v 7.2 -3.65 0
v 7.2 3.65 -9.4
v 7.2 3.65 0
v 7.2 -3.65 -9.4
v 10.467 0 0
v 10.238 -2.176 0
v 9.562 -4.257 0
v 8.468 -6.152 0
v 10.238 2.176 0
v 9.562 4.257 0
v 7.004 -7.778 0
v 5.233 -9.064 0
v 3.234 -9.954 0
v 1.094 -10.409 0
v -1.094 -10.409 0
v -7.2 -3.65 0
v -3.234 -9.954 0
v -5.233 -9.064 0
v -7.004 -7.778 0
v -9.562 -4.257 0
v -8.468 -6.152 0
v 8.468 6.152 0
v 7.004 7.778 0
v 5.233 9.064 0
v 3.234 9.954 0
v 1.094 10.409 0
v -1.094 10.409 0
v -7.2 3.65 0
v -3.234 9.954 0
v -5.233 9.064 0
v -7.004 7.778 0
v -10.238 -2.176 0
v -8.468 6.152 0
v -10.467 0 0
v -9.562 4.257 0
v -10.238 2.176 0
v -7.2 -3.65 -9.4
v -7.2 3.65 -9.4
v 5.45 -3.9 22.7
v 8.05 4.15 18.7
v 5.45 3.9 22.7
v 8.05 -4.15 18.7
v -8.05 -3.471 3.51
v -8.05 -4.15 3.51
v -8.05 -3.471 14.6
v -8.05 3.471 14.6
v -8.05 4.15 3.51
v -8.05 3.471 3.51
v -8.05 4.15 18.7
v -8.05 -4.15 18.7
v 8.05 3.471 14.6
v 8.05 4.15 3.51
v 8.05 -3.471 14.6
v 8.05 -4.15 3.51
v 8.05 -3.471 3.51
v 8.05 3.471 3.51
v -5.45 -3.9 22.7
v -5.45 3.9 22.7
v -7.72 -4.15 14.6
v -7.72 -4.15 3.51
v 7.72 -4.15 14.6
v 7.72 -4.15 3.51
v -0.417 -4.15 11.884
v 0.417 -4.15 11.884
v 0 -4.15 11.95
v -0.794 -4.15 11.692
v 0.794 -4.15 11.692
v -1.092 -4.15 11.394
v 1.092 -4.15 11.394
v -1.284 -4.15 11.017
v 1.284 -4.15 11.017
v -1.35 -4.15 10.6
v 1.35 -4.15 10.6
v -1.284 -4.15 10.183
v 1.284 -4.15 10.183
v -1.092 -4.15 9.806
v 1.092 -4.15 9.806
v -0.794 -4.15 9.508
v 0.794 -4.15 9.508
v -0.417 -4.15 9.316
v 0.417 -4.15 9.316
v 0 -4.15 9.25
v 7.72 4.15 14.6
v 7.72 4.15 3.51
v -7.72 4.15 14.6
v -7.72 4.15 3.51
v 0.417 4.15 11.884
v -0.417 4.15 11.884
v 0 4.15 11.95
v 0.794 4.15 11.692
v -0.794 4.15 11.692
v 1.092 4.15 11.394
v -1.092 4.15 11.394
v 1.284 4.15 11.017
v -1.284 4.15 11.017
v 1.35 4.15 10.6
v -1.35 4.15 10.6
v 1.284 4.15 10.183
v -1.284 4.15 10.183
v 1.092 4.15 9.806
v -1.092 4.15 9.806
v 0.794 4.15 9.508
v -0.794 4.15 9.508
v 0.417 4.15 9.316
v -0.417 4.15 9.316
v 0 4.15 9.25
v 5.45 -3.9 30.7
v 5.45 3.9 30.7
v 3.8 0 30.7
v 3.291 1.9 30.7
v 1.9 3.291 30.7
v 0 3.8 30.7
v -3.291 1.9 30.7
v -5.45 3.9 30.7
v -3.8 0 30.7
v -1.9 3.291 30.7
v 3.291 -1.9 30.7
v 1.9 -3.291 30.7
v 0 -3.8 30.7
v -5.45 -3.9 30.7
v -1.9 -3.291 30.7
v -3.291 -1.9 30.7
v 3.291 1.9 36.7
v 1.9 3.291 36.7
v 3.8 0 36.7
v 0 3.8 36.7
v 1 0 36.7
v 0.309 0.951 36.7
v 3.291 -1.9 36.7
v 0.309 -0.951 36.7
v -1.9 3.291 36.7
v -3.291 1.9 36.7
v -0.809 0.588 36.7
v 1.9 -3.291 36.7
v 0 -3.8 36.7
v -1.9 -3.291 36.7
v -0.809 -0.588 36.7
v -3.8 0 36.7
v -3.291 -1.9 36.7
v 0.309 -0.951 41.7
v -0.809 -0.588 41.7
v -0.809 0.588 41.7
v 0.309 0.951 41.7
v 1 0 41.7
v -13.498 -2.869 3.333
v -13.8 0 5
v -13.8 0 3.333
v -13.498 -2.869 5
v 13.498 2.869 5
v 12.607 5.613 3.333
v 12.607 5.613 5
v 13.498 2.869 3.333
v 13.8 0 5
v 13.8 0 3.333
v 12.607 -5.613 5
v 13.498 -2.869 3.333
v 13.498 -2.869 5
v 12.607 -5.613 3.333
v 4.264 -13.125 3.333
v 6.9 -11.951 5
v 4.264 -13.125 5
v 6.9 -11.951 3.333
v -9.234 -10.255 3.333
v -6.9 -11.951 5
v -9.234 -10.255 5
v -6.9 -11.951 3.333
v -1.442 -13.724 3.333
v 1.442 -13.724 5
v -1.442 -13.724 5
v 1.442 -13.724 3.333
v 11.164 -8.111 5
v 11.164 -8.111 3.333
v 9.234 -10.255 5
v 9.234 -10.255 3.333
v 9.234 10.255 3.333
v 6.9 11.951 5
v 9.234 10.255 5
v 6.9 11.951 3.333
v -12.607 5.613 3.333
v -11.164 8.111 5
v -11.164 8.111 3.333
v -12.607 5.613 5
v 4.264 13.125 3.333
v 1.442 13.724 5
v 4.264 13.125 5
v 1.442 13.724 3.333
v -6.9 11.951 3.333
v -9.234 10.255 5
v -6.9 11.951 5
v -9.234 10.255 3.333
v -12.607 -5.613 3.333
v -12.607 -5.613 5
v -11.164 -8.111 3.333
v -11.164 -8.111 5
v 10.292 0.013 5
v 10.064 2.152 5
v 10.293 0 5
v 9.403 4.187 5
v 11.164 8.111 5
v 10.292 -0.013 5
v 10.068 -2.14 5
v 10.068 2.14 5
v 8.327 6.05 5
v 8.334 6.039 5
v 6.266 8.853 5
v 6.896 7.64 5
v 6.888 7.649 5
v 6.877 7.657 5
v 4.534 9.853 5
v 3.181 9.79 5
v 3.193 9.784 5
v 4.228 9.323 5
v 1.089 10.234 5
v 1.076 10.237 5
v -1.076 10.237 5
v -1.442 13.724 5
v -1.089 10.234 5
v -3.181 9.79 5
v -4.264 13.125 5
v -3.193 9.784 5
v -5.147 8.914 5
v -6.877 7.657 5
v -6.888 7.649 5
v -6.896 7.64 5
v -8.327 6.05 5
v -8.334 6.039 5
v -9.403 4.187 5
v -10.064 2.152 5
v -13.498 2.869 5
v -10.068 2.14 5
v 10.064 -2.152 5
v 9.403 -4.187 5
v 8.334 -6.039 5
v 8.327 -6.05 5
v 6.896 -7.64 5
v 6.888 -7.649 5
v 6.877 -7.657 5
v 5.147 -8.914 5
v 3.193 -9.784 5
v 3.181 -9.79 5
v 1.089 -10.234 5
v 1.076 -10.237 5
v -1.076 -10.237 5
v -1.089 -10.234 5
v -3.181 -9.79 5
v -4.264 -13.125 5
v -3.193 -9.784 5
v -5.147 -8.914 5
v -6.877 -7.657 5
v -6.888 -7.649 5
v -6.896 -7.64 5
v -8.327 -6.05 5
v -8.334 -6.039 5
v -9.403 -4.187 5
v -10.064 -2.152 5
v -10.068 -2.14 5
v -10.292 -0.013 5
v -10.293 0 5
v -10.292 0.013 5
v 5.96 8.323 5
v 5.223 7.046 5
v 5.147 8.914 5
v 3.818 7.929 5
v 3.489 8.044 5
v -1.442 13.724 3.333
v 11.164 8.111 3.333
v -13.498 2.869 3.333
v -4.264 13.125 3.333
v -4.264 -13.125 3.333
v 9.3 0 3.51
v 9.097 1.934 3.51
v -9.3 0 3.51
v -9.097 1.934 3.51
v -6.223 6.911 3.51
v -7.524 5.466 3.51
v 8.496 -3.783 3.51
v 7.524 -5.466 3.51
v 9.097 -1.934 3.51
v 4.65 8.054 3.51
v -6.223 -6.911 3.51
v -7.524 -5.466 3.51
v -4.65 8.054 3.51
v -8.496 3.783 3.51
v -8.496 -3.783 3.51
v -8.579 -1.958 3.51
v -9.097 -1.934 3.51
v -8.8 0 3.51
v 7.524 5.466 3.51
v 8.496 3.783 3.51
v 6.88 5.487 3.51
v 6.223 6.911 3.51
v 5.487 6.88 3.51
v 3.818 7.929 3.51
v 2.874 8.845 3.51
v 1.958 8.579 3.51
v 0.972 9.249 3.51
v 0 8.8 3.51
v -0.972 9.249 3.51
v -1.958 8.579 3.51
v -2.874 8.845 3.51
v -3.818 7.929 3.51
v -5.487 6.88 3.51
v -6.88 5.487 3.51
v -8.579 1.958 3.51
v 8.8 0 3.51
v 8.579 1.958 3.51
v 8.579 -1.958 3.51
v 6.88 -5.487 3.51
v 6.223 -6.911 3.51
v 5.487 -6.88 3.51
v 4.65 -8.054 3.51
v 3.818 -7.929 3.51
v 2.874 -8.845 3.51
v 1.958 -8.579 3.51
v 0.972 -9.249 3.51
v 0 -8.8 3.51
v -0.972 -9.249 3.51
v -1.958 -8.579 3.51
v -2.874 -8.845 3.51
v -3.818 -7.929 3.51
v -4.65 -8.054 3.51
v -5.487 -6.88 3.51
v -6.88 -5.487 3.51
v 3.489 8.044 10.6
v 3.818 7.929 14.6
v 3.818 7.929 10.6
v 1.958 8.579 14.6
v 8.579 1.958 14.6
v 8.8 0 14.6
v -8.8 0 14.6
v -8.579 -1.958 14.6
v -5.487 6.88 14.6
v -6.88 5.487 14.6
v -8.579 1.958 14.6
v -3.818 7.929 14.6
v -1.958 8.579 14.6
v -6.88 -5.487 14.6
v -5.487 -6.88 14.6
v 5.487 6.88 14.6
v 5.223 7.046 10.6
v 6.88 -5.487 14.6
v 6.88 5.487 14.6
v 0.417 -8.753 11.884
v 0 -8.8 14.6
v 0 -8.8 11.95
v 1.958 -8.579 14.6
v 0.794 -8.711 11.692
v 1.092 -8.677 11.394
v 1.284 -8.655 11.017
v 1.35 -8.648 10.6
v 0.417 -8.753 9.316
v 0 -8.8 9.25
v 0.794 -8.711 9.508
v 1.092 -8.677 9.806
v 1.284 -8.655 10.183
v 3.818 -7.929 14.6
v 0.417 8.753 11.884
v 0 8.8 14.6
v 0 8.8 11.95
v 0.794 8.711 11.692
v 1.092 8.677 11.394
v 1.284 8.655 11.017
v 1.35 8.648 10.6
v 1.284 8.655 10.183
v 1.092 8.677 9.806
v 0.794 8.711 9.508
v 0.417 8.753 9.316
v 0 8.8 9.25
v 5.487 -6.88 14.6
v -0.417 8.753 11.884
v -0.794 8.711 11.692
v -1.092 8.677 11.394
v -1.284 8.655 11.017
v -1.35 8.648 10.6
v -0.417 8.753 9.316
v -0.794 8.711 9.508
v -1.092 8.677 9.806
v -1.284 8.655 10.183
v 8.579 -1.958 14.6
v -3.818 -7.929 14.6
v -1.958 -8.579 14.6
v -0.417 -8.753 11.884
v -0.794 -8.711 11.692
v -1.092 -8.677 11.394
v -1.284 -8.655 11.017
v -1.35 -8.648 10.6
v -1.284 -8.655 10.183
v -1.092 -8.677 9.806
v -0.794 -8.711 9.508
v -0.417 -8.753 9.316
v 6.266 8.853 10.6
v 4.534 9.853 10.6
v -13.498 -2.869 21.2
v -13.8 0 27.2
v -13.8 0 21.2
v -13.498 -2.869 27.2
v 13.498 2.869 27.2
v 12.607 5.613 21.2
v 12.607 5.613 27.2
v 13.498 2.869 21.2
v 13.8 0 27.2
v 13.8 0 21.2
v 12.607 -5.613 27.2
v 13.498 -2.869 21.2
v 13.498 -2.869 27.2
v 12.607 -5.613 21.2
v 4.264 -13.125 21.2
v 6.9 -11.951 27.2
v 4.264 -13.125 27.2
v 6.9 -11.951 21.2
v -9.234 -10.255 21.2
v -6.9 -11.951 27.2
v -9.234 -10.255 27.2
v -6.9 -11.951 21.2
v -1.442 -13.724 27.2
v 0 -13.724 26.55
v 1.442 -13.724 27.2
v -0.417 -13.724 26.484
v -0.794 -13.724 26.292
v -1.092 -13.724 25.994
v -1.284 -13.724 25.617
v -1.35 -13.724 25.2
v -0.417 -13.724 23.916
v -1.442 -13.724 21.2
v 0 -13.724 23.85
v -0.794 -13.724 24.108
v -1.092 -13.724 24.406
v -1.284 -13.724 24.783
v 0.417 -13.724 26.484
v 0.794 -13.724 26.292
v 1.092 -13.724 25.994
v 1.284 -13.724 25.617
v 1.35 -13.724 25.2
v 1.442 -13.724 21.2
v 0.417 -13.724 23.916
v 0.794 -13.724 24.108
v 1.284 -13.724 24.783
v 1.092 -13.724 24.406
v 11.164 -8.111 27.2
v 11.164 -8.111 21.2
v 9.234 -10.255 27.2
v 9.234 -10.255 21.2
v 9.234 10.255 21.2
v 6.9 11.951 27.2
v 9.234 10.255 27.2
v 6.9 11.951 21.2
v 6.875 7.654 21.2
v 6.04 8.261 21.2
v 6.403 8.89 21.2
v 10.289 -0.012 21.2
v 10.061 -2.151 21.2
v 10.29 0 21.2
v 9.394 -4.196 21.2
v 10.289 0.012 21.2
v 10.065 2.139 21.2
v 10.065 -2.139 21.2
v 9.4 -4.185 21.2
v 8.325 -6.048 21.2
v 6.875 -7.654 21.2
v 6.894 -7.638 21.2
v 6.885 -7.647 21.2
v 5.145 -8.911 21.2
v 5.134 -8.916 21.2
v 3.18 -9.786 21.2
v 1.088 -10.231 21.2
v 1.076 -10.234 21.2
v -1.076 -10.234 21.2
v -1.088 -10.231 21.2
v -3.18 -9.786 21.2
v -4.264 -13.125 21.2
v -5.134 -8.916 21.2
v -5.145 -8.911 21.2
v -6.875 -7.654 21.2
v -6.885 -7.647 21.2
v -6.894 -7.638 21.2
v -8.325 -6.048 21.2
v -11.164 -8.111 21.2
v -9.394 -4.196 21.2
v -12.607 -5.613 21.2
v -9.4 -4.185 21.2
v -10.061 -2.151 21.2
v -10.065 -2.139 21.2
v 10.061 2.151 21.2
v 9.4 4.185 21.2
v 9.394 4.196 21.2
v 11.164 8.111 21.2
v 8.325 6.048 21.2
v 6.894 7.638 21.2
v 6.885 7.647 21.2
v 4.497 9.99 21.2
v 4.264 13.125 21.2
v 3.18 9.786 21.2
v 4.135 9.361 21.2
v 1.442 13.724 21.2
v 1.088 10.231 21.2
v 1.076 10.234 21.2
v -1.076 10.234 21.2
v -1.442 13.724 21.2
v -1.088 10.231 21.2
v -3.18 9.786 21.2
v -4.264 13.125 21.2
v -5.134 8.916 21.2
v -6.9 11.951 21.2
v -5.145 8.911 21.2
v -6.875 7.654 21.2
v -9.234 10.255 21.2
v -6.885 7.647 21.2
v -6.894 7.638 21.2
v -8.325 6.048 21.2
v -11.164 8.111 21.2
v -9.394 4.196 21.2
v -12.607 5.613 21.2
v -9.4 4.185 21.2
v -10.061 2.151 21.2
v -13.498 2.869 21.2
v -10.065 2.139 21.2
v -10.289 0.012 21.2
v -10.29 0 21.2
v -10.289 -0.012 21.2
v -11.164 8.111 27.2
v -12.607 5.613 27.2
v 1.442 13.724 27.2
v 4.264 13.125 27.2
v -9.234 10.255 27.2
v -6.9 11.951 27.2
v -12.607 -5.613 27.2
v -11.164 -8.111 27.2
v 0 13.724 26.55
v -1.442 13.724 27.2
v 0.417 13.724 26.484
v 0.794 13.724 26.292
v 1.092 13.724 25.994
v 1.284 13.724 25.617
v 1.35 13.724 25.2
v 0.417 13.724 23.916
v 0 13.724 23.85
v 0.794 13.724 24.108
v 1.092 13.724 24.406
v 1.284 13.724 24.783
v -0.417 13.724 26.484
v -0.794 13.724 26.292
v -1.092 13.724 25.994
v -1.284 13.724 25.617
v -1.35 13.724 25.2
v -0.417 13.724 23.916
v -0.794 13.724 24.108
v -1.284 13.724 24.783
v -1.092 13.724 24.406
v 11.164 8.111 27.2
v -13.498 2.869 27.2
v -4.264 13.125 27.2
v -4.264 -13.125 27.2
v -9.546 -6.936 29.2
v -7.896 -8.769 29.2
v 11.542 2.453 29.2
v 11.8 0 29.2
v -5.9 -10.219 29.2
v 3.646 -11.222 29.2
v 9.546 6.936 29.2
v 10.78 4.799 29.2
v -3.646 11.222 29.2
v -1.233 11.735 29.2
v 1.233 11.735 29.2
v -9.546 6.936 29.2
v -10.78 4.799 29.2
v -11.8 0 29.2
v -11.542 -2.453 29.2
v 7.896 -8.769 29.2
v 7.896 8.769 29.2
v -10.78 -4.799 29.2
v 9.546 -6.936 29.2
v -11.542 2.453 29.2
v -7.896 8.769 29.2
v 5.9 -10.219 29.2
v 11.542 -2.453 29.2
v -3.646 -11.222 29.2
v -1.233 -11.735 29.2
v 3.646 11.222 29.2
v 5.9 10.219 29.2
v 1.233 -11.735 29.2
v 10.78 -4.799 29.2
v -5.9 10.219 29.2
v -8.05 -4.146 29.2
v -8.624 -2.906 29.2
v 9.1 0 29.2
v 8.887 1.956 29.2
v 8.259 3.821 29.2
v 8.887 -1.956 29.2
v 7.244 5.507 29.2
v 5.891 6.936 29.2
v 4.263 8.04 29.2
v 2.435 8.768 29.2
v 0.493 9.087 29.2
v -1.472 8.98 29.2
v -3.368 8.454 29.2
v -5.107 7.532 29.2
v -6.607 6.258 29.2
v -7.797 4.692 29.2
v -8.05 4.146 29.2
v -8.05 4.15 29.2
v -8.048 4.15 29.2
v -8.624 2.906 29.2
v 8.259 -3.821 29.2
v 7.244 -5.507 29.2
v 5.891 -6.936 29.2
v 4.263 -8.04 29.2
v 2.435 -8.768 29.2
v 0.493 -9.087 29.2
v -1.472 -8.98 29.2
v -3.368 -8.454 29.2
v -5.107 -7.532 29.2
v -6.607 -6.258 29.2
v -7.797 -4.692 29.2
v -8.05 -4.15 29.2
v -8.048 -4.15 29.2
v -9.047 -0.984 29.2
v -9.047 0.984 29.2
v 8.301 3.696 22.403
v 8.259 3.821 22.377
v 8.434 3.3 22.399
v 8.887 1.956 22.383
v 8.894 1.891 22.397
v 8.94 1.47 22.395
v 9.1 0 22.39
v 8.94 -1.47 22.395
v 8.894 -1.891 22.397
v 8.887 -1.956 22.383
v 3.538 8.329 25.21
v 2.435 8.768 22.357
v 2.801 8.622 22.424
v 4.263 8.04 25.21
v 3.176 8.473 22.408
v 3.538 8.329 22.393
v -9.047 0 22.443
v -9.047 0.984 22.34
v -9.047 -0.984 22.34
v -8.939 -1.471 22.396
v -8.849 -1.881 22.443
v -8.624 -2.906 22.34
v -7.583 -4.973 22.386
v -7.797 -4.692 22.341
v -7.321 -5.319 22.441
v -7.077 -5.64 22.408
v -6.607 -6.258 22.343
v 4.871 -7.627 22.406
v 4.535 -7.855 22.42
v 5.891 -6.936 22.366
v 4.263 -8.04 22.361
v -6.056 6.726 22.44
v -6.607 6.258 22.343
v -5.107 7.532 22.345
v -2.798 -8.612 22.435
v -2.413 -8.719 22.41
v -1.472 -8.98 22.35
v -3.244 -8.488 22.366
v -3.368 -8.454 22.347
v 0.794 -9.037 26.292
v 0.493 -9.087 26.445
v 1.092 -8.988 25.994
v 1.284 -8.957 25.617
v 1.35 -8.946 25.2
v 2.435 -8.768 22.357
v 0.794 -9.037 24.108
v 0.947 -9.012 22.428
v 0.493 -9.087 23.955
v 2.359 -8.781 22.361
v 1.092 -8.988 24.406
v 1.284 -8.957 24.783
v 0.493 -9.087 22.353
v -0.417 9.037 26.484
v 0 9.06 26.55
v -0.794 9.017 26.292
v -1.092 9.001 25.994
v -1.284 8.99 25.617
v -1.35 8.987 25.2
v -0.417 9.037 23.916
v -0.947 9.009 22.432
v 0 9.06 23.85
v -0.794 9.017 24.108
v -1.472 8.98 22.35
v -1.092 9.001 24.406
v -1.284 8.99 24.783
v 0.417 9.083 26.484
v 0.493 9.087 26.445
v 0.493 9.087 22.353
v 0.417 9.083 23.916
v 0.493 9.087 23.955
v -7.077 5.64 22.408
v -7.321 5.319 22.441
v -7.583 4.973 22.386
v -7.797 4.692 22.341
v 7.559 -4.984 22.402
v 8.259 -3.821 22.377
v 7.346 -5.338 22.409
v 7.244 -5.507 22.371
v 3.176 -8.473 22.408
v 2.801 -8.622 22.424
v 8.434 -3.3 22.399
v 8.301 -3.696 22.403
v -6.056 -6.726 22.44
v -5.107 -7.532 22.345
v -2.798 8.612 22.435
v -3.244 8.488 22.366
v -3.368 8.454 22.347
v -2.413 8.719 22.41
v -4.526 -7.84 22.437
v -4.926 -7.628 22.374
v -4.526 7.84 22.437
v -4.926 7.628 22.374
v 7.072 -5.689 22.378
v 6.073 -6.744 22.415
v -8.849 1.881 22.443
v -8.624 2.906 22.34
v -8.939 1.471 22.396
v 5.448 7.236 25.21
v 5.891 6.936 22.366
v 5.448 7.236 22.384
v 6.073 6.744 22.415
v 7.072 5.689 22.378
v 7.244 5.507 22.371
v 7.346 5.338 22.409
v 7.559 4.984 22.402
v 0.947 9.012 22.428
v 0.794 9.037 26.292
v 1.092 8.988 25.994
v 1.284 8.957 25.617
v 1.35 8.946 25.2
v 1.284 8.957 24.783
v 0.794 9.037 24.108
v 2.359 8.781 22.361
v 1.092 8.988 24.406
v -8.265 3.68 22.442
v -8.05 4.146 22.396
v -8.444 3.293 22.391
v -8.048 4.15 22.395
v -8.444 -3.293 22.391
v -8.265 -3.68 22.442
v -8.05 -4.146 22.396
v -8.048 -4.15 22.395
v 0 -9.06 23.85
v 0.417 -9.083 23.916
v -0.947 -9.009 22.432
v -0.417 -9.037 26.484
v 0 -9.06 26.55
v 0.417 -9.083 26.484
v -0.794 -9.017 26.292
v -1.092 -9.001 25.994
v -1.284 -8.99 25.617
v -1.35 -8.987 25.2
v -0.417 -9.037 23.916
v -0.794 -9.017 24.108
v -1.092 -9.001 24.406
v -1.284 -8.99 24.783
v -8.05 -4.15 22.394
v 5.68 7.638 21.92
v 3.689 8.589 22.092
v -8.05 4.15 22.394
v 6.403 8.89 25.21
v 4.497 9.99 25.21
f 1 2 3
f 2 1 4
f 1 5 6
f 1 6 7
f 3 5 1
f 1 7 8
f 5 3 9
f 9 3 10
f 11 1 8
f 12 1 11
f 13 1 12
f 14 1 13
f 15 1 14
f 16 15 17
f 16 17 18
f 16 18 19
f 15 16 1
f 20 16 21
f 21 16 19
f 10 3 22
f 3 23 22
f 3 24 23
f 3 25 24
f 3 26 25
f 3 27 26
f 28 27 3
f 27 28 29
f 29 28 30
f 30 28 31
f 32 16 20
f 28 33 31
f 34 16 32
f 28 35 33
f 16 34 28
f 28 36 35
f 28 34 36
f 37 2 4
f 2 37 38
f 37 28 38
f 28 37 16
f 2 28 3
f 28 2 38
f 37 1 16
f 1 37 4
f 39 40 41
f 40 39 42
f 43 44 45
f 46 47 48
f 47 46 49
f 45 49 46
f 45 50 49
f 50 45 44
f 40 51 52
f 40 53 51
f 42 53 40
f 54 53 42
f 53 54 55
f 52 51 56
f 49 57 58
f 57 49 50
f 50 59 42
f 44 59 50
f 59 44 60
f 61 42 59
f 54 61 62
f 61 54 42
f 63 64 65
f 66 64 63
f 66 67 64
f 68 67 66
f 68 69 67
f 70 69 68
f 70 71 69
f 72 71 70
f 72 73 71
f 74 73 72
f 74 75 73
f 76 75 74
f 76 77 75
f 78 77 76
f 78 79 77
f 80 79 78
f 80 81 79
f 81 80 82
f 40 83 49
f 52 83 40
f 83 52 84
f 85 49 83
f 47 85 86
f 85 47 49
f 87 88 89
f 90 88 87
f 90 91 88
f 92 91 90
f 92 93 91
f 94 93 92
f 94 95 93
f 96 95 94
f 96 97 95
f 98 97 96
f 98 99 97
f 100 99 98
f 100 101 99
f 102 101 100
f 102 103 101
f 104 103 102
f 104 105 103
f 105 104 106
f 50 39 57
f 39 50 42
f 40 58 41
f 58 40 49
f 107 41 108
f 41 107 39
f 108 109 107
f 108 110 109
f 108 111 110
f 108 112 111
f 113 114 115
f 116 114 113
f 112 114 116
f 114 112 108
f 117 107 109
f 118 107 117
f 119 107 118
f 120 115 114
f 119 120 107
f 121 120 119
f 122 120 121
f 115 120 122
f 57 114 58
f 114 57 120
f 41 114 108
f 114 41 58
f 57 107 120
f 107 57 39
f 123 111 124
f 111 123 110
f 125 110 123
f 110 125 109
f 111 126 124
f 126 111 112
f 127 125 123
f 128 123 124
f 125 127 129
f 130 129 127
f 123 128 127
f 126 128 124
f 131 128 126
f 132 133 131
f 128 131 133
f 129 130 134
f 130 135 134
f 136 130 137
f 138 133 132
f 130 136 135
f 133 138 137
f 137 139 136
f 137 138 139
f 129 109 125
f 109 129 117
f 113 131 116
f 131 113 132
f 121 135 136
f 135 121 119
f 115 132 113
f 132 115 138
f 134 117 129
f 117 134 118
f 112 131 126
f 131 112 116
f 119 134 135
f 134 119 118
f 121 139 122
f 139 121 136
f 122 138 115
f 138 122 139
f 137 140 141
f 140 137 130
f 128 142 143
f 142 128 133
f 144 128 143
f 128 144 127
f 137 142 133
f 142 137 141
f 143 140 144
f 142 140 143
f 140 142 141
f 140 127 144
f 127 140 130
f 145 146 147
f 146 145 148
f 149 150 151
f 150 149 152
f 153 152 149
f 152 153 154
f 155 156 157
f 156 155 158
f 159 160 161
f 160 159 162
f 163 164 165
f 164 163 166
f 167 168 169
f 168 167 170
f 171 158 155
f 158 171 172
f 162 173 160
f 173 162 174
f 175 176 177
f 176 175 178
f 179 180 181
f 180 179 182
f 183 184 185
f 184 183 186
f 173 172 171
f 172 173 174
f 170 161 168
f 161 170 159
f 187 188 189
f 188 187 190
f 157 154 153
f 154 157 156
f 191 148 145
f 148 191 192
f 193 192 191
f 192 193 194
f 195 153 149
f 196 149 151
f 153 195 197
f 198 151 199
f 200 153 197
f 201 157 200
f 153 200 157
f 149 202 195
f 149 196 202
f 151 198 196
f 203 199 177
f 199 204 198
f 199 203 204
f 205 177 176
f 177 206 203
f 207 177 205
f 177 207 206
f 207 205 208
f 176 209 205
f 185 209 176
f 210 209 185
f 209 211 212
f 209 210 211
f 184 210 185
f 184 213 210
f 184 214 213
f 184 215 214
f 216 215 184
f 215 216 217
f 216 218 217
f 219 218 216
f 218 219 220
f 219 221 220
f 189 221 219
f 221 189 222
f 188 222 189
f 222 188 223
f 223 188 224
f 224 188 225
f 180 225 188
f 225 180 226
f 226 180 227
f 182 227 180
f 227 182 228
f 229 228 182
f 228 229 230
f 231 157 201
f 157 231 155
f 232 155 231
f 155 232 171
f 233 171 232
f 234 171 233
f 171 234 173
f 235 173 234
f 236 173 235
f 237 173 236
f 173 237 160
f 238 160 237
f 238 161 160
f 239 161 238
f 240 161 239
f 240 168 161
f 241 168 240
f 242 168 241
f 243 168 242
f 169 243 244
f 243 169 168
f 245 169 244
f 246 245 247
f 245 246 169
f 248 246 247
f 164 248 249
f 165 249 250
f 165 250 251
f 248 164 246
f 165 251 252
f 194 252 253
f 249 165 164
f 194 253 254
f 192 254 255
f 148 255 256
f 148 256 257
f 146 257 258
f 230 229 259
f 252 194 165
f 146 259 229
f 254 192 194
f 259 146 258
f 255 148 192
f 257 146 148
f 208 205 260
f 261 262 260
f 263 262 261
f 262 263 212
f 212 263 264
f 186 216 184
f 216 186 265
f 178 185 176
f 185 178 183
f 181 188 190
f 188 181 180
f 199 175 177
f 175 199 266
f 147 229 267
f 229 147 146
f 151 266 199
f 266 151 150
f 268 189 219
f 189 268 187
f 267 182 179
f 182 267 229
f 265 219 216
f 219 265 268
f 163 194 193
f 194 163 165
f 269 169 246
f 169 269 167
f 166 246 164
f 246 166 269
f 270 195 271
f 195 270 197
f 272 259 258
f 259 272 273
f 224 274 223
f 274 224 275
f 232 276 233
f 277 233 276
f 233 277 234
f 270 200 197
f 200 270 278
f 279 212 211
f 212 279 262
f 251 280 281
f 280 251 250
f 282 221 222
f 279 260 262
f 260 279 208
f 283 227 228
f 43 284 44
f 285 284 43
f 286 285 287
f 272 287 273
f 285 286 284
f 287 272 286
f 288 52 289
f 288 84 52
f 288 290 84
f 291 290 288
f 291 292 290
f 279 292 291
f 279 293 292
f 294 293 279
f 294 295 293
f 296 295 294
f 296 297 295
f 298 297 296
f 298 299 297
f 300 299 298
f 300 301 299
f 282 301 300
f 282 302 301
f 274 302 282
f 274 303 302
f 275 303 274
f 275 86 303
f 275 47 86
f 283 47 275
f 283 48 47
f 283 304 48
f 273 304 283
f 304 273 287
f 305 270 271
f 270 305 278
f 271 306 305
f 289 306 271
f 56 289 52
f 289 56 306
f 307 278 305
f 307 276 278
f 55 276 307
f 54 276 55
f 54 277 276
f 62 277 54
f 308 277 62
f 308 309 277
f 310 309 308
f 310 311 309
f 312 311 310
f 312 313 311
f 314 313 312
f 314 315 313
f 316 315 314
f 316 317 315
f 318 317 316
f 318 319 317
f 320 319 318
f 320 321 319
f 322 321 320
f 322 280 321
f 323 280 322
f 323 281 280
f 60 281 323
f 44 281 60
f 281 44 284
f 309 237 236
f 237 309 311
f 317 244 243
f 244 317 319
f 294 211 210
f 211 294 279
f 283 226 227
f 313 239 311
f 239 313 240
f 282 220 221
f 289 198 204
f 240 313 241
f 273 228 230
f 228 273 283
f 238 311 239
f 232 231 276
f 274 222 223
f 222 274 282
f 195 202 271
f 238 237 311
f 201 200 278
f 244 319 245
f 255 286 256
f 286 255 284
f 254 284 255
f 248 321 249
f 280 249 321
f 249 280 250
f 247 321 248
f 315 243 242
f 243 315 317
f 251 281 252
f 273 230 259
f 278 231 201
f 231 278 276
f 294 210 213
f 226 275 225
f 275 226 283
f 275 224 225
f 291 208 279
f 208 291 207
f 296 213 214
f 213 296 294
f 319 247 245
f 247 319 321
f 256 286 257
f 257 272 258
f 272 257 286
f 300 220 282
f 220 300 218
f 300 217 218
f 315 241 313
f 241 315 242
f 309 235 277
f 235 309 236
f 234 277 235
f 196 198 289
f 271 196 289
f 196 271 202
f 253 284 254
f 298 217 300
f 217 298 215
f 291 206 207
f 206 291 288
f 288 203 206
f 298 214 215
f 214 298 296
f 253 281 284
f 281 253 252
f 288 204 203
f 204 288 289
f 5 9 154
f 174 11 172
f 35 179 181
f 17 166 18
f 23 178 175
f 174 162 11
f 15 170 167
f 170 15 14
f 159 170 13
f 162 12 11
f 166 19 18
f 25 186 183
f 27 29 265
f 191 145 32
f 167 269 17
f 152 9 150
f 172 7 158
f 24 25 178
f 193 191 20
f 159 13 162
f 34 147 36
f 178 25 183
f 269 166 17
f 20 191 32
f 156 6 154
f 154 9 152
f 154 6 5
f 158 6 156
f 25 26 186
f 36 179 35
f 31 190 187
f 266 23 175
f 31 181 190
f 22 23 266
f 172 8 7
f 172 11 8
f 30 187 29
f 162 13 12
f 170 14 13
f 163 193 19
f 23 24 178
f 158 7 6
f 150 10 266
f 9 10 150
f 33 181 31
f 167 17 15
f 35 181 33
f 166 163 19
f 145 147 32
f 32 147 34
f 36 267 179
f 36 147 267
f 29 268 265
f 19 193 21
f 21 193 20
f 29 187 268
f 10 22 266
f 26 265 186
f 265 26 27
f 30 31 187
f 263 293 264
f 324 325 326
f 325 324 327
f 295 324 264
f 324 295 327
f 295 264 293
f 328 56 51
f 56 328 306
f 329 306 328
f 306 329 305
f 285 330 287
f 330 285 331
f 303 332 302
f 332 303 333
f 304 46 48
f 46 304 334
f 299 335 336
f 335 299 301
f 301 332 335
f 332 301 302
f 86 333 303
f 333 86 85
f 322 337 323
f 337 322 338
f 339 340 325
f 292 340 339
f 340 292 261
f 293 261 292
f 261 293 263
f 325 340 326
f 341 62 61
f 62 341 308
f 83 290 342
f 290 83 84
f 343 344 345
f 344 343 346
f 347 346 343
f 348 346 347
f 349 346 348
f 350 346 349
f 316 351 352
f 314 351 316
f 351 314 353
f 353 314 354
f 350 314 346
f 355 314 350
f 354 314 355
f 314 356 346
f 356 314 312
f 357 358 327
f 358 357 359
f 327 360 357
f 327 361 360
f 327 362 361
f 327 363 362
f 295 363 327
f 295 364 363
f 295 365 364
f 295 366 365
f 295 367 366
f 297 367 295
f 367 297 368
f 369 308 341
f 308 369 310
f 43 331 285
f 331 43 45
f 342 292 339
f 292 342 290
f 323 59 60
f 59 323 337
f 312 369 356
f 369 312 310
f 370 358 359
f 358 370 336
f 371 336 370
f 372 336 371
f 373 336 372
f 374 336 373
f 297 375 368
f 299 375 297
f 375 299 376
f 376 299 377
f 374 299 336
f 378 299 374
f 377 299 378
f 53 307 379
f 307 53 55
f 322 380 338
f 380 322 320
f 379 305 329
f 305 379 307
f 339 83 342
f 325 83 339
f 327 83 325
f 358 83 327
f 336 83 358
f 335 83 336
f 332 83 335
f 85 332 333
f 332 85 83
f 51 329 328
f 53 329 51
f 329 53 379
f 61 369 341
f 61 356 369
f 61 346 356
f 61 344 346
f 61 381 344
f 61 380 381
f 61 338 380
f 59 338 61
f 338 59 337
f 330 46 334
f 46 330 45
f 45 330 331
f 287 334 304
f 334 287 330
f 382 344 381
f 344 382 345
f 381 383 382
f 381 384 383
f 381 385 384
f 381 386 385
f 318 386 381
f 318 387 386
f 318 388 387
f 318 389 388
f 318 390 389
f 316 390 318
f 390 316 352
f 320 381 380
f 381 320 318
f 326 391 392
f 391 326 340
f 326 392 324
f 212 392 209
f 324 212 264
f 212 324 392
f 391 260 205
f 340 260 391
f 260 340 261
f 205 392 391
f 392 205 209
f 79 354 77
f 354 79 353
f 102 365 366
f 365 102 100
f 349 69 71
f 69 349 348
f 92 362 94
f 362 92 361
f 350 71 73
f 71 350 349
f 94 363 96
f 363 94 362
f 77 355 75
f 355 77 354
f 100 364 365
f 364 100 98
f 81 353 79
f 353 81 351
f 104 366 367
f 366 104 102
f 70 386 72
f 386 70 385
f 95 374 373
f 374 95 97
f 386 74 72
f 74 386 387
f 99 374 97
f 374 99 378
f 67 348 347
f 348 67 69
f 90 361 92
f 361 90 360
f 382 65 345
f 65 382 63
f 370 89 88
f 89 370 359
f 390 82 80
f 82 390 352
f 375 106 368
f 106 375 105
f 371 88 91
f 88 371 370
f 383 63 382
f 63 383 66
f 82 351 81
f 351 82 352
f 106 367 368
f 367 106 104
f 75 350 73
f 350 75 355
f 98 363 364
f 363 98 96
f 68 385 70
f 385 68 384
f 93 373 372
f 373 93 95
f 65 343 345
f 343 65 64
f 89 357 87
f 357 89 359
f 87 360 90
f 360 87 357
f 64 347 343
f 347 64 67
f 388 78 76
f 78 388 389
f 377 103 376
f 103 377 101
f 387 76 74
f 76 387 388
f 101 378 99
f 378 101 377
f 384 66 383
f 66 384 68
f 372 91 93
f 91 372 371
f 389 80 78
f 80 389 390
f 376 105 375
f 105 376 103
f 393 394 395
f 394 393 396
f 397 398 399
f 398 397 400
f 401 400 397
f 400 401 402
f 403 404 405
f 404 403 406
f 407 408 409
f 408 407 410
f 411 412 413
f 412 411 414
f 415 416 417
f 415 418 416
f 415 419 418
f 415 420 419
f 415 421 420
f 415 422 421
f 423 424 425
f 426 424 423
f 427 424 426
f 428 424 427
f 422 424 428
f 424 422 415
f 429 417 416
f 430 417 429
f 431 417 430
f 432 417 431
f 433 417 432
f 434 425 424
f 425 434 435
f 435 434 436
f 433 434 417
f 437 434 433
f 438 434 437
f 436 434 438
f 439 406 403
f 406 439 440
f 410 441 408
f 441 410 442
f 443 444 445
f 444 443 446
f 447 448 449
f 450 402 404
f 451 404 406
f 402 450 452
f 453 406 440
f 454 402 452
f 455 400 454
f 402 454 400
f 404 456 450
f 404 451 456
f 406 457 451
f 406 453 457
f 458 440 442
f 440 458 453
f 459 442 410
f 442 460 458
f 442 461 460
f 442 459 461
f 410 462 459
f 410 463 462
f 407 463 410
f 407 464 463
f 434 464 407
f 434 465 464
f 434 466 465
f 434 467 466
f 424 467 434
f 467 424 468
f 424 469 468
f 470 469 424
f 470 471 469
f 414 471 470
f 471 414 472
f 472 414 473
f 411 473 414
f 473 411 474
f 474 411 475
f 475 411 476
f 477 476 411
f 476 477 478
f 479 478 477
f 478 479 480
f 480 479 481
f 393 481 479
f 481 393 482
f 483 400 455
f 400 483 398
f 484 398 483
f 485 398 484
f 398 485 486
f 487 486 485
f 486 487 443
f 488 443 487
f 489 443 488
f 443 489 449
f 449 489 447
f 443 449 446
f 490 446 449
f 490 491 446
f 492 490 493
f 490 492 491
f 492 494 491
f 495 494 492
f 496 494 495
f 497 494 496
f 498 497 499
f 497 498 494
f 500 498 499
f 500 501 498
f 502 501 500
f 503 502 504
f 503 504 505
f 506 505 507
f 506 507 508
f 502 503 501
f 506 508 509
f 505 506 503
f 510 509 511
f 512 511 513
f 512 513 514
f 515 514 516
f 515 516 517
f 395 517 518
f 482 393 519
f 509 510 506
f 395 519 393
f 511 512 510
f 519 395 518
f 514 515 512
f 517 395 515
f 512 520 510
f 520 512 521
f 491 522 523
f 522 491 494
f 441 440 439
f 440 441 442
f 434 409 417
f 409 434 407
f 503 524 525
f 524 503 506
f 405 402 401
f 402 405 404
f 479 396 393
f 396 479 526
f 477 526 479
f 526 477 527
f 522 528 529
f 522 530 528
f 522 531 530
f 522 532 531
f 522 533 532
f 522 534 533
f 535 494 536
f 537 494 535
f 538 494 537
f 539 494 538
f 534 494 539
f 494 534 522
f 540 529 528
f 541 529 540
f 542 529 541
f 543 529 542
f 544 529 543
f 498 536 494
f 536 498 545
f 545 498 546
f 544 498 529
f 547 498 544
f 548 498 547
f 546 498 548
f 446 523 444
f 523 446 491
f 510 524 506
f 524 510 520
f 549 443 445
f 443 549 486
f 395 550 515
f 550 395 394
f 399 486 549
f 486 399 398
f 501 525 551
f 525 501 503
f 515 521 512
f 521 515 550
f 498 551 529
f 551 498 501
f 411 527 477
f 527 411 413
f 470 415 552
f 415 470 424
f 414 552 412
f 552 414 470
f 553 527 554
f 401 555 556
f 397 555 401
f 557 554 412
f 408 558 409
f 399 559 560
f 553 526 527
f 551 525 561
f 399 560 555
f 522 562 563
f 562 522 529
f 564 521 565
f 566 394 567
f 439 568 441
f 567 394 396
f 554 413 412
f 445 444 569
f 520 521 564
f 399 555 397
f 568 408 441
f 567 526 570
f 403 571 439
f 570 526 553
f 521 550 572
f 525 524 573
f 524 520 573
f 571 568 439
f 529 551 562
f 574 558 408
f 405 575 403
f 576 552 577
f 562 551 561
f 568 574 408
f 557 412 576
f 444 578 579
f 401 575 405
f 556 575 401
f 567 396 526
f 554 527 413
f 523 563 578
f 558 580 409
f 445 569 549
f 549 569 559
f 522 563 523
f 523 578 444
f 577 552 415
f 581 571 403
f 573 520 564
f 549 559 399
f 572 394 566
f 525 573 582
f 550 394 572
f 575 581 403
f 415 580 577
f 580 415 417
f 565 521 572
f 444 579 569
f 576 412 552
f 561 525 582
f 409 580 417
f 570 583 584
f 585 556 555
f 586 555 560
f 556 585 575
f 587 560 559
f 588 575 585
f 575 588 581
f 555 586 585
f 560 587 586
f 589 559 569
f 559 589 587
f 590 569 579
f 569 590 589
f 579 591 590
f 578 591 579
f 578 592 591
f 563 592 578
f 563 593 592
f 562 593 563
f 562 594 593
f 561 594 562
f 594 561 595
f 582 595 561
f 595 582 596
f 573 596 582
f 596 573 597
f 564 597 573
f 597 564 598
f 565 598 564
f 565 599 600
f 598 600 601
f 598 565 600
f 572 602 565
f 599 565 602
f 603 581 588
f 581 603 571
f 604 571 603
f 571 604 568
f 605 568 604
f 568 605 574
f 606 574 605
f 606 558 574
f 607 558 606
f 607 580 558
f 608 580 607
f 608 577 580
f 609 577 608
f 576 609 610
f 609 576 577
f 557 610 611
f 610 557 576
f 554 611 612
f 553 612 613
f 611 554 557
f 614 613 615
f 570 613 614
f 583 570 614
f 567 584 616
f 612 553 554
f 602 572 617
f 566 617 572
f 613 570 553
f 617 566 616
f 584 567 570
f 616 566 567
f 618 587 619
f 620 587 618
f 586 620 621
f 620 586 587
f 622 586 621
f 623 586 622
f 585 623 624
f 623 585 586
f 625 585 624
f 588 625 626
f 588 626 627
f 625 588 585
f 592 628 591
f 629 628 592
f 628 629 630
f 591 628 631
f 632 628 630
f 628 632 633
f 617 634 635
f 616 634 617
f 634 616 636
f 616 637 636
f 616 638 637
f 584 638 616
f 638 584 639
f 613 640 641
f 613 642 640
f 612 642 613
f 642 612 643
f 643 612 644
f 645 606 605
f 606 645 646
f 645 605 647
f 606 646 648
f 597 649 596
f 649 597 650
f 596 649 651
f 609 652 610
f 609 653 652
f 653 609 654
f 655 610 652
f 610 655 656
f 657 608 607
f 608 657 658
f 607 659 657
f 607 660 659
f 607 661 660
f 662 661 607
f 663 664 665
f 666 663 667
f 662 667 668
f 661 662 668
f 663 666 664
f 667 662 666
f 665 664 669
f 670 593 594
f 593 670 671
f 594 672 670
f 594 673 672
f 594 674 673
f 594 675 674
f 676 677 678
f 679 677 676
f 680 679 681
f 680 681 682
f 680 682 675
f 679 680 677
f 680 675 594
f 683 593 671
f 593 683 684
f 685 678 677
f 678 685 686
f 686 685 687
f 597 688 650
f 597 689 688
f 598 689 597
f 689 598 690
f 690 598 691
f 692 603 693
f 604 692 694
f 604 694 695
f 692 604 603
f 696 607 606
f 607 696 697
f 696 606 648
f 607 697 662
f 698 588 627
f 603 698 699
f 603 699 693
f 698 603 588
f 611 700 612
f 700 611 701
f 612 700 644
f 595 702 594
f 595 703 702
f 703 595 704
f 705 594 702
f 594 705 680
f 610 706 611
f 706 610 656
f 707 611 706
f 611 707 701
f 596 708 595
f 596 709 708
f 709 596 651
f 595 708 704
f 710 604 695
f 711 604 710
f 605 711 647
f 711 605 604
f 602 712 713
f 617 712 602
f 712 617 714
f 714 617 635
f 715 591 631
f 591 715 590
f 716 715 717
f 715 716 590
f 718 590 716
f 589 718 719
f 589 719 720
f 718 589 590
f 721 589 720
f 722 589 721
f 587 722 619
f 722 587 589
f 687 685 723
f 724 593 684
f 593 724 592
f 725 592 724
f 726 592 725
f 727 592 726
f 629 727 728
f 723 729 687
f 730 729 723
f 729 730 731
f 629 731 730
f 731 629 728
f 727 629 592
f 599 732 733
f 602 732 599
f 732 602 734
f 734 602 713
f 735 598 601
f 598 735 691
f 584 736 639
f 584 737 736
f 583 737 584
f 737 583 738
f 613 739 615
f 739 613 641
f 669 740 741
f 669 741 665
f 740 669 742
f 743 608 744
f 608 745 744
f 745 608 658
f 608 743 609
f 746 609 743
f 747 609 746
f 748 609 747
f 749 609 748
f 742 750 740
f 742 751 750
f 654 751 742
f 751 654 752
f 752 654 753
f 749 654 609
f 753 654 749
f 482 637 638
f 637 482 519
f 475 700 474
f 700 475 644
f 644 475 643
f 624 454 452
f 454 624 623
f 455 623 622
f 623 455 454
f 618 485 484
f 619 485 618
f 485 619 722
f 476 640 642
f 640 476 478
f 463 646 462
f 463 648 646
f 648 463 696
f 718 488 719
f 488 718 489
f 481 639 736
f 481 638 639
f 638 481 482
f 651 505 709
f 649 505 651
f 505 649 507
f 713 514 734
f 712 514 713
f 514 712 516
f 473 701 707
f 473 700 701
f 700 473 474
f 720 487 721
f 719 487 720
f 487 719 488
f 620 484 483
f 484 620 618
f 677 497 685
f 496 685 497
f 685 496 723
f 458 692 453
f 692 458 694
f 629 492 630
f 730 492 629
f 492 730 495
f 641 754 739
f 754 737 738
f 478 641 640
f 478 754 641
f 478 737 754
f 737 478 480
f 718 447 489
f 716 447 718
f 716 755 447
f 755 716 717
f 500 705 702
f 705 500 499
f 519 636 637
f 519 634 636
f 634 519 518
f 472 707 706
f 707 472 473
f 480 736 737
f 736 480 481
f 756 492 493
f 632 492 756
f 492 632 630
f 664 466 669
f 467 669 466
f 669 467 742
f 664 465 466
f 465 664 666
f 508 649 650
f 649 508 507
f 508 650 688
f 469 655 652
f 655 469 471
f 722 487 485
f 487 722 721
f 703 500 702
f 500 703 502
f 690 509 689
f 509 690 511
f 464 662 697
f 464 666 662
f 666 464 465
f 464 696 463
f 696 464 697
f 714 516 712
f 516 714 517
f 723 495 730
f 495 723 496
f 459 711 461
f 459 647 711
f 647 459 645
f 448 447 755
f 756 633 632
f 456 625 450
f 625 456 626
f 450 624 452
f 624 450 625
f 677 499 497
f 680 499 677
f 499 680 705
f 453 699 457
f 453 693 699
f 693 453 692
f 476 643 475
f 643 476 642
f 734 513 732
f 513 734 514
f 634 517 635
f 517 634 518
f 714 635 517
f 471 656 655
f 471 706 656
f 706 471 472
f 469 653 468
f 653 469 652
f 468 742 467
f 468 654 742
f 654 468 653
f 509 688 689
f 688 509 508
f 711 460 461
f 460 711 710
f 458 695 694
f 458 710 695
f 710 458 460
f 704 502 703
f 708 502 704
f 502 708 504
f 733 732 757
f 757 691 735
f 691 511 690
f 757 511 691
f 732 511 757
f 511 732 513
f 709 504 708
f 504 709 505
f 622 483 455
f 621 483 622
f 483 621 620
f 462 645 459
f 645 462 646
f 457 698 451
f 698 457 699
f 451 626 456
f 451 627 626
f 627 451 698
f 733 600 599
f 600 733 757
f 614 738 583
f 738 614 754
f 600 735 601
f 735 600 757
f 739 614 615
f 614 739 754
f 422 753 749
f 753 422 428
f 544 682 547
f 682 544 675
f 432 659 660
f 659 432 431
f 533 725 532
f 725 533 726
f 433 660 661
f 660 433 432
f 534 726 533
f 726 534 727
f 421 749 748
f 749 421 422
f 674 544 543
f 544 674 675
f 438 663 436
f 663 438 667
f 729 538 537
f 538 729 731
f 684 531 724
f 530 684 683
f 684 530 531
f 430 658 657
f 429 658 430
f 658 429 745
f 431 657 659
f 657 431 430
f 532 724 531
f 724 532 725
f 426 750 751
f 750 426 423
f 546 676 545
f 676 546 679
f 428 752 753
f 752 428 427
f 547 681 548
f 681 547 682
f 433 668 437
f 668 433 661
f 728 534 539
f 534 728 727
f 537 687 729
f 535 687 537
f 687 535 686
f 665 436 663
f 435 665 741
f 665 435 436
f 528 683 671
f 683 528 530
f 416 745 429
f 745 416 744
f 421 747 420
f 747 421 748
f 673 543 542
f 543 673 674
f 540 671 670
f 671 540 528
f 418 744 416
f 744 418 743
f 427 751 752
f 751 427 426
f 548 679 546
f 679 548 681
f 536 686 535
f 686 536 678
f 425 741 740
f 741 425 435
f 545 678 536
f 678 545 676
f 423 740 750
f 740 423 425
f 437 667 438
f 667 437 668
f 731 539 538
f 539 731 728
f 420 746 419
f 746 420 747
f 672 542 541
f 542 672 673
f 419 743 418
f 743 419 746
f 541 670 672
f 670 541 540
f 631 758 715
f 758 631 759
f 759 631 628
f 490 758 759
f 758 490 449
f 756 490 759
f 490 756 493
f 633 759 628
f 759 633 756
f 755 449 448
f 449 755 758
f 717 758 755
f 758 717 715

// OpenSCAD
//Makes a hole grommet that a USB cable plug or socket can be jammed into.
//Locking ring has a side screw to hold it, and clamp USB connector
// anti-rotation key provided
/*[Global]*/
//Choose Which parts to show
Show="all"; //[all,flange,ring,usb]

//Choose the view
//View="printable"; //[assembly, exploded, printable]
//View="assembly";
View="exploded"; //[assembly, exploded, printable]

//Display USB Plug
ViewUSB="showusb"; //[showusb,hideusb]

/*[Panel]*/
//Diameter of hole that grommet goes through
MountingHoleD=17.6;

HoleR=MountingHoleD/2;

//Thickness of case material - small burring is OK as a broove is provided for it
PanelH=1.6;
//inside suffers from a raised edge from drilling, so recess it
PanelBurrBevel=1.5;

//correction for holes being small on UP printer
holeos=0.3;

/*[Flange]*/
//Outside Flange is bigger than Mounting Hole by this much (each side)
FlangeW=5;

FlangeOR=(MountingHoleD+FlangeW*2) /2;

FlangeH=FlangeW;
FlangeBevel=FlangeW*2/3;

//width of anti-rotation key tit. Set to 0 to not have it. (or just cut it off)
KeyW=2;
//Height of key above panel thickness, i.e. into ring
KeyH=4;

/*[Ring]*/
//Thickness of the internal Ring part (protrusion into the internal space)
InternalH=8;
//diameter of screw holes that screw ring to flange and locks USB in place. (Length of screw is shown on console)
ScrewD=2.4;
ScrewIR=(ScrewD+holeos)/2;

/*[USB]*/
//Size of USB plug moulding at widest part - this is a compression fit
USBX=16.1;
USBY=8.3;
//How to Grip the USB plug: Everything below here is relevant to positive retention only, for compression+screw you can ignore it.
USBGripStyle="compression"; //[compression, positive-not-implemented]
//Moulding length at main width. Only used when using positive restention
USBZ=18.7;
//Length of tapering moulding back to narrow rectangle part
USBZ1=4;
//Smaller rectangle before strain relief
USBZ2=8;
USBY2=7.8;
USBX2=10.9;
//diameter at the strain relief
USBReliefD=7.6;
USBReliefR=USBReliefD/2;
USBReliefZ=6;
//diameter of the cable
USBCableD=4/2;
USBCableR=USBCableD/2;
USBCableZ=5;

//Select Male or Female USB socket 
USBGender="female"; //[male,female]
//USBGender="female";
//Dimensions of metal part. 
USBMaleX=12.2;
USBMaleY=4.6;
USBMaleZ=12.8;

USBFemaleX=14.4;
USBFemaleY=7.3;
USBFemaleZ=9.4;

//-------------
H=PanelH+InternalH+FlangeH;


echo(str("Screw thread length = ", FlangeOR-USBY/2,"mm"));
echo(str("Flange Diameter = ",FlangeOR*2,"mm"));

//Make a cube which is centred on some axes
//center can be xy,x,y,z,true, 
// if ends with "-" then extends Z and offsets, for use in differences
module cubec(size=1, center="xy", offset=[0,0,0]) {
//    //if (center[len(center)-1] =="-") { 
//    if (offset=="-") {
//        size=size+[0, 0, .02];
//        //offset=offset - [0, 0, 0.01];
//         offset = [0, 0, 0.01];
//    }//if
// 
    if (center=="xy")  translate( offset + [-size[0]/2, -size[1]/2, 0]) cube(size);
    if (center=="x")   translate(offset+[-size[0]/2, 0, 0]) cube(size);
    if (center=="y")   translate(offset+[0, -size[1]/2, 0]) cube(size);
    if (center=="z")   translate(offset+[0,0,-size[2]/2]) cube(size);
    if (center==true || center=="xyz") translate(-size/2) cube(size);      
}//mod


module USBHole() {
    cubec([USBX,USBY,H+0.02],center="xy", offset=[0,0,-0.01]);
}//mod

//makes a USB plug shape
module USBPlug() {
    if (USBGender=="male") {
            translate([0,0,-USBMaleZ]) cubec([USBMaleX,USBMaleY,USBMaleZ],center="xy");
    }else{
            translate([0,0,-USBFemaleZ]) cubec([USBFemaleX,USBFemaleY,USBFemaleZ],center="xy");
    }//if
        
    hull() {
    cubec([USBX,USBY,USBZ],center="xy");
    translate([0,0,USBZ]) cubec([USBX2,USBY2,USBZ1],center="xy");
    }
    translate([0,0,USBZ+USBZ1]) cubec([USBX2,USBY2,USBZ2],center="xy");
    translate([0,0,USBZ+USBZ1+USBZ2]) cylinder(r=USBReliefR, h=USBReliefZ);
    translate([0,0,USBZ+USBZ1+USBZ2+USBReliefZ]) cylinder(r=USBCableR, h=USBCableZ);
}//mod

module Screw() {
    rotate([90,0,0]) cylinder(r=ScrewIR, h=FlangeOR*2+5,$fn=20,center=true);
}

//------------------------------------------------------------

module FlangePart() {
   color("red") 
difference() {    
    union() {
        //flange
        cylinder(r1=FlangeOR-FlangeBevel, r2=FlangeOR, h=FlangeBevel); 
        difference() {
            translate([0,0, FlangeBevel]) 
                cylinder(r=FlangeOR, h=FlangeH-FlangeBevel);
                translate([0,0,FlangeH-PanelBurrBevel+0.01]) cylinder(r1=HoleR+0.5, r2=HoleR+PanelBurrBevel, h=PanelBurrBevel);    
        }//diff
        //rod
        cylinder(r=HoleR, h=H);
        rotate([0,0,60]) translate([HoleR,0,FlangeH]) 
                cubec([KeyW*2,KeyW,KeyH+PanelH],center="xy");
    }//union
    USBHole();
    translate([0,0,FlangeH+PanelH+InternalH/2]) Screw();
    
}//diff 
}//mod

module Ring() {
        difference() {
        union() {
         cylinder(r=FlangeOR, h=InternalH*3/4);
         translate([0,0,InternalH*3/4]) cylinder(r1=FlangeOR,r2=FlangeOR-InternalH/4, h=InternalH/4);   
        }//union   
         USBHole();
         translate([0,0,-0.01]) {
             cylinder(r=HoleR+holeos, h=H+0.01);
             cylinder(r2=HoleR, r1=HoleR+PanelBurrBevel, h=PanelBurrBevel);    
         }
         translate([0,0,InternalH/2]) Screw(); //screw holes
         rotate([0,0,60]) translate([HoleR,0,-0.01]) 
                cubec([KeyW*2+0.2,KeyW+0.2,KeyH+0.02],center="xy"); //key slot
    }
}//mod



//Main
if ((ViewUSB=="showusb" && View!="printable") || Show=="usb") color("lightgreen") 
    if (View=="exploded") {
            translate([0,0,H+FlangeH+PanelH]+20) USBPlug();
    }else{
        USBPlug();
    }

if (Show=="all" || Show=="flange")  FlangePart();

if (Show=="all" || Show=="ring")
     color("cyan")
    if (View=="assembly") {
        translate([0,0,FlangeH+PanelH]) Ring();  
    } else {
         if (View=="exploded") {
            translate([0,0,H+FlangeH+PanelH]) Ring();  
         }else {
            translate([FlangeOR*2+5,0,InternalH]) rotate([0,180,0]) Ring();  //ready to print
         }
    }
